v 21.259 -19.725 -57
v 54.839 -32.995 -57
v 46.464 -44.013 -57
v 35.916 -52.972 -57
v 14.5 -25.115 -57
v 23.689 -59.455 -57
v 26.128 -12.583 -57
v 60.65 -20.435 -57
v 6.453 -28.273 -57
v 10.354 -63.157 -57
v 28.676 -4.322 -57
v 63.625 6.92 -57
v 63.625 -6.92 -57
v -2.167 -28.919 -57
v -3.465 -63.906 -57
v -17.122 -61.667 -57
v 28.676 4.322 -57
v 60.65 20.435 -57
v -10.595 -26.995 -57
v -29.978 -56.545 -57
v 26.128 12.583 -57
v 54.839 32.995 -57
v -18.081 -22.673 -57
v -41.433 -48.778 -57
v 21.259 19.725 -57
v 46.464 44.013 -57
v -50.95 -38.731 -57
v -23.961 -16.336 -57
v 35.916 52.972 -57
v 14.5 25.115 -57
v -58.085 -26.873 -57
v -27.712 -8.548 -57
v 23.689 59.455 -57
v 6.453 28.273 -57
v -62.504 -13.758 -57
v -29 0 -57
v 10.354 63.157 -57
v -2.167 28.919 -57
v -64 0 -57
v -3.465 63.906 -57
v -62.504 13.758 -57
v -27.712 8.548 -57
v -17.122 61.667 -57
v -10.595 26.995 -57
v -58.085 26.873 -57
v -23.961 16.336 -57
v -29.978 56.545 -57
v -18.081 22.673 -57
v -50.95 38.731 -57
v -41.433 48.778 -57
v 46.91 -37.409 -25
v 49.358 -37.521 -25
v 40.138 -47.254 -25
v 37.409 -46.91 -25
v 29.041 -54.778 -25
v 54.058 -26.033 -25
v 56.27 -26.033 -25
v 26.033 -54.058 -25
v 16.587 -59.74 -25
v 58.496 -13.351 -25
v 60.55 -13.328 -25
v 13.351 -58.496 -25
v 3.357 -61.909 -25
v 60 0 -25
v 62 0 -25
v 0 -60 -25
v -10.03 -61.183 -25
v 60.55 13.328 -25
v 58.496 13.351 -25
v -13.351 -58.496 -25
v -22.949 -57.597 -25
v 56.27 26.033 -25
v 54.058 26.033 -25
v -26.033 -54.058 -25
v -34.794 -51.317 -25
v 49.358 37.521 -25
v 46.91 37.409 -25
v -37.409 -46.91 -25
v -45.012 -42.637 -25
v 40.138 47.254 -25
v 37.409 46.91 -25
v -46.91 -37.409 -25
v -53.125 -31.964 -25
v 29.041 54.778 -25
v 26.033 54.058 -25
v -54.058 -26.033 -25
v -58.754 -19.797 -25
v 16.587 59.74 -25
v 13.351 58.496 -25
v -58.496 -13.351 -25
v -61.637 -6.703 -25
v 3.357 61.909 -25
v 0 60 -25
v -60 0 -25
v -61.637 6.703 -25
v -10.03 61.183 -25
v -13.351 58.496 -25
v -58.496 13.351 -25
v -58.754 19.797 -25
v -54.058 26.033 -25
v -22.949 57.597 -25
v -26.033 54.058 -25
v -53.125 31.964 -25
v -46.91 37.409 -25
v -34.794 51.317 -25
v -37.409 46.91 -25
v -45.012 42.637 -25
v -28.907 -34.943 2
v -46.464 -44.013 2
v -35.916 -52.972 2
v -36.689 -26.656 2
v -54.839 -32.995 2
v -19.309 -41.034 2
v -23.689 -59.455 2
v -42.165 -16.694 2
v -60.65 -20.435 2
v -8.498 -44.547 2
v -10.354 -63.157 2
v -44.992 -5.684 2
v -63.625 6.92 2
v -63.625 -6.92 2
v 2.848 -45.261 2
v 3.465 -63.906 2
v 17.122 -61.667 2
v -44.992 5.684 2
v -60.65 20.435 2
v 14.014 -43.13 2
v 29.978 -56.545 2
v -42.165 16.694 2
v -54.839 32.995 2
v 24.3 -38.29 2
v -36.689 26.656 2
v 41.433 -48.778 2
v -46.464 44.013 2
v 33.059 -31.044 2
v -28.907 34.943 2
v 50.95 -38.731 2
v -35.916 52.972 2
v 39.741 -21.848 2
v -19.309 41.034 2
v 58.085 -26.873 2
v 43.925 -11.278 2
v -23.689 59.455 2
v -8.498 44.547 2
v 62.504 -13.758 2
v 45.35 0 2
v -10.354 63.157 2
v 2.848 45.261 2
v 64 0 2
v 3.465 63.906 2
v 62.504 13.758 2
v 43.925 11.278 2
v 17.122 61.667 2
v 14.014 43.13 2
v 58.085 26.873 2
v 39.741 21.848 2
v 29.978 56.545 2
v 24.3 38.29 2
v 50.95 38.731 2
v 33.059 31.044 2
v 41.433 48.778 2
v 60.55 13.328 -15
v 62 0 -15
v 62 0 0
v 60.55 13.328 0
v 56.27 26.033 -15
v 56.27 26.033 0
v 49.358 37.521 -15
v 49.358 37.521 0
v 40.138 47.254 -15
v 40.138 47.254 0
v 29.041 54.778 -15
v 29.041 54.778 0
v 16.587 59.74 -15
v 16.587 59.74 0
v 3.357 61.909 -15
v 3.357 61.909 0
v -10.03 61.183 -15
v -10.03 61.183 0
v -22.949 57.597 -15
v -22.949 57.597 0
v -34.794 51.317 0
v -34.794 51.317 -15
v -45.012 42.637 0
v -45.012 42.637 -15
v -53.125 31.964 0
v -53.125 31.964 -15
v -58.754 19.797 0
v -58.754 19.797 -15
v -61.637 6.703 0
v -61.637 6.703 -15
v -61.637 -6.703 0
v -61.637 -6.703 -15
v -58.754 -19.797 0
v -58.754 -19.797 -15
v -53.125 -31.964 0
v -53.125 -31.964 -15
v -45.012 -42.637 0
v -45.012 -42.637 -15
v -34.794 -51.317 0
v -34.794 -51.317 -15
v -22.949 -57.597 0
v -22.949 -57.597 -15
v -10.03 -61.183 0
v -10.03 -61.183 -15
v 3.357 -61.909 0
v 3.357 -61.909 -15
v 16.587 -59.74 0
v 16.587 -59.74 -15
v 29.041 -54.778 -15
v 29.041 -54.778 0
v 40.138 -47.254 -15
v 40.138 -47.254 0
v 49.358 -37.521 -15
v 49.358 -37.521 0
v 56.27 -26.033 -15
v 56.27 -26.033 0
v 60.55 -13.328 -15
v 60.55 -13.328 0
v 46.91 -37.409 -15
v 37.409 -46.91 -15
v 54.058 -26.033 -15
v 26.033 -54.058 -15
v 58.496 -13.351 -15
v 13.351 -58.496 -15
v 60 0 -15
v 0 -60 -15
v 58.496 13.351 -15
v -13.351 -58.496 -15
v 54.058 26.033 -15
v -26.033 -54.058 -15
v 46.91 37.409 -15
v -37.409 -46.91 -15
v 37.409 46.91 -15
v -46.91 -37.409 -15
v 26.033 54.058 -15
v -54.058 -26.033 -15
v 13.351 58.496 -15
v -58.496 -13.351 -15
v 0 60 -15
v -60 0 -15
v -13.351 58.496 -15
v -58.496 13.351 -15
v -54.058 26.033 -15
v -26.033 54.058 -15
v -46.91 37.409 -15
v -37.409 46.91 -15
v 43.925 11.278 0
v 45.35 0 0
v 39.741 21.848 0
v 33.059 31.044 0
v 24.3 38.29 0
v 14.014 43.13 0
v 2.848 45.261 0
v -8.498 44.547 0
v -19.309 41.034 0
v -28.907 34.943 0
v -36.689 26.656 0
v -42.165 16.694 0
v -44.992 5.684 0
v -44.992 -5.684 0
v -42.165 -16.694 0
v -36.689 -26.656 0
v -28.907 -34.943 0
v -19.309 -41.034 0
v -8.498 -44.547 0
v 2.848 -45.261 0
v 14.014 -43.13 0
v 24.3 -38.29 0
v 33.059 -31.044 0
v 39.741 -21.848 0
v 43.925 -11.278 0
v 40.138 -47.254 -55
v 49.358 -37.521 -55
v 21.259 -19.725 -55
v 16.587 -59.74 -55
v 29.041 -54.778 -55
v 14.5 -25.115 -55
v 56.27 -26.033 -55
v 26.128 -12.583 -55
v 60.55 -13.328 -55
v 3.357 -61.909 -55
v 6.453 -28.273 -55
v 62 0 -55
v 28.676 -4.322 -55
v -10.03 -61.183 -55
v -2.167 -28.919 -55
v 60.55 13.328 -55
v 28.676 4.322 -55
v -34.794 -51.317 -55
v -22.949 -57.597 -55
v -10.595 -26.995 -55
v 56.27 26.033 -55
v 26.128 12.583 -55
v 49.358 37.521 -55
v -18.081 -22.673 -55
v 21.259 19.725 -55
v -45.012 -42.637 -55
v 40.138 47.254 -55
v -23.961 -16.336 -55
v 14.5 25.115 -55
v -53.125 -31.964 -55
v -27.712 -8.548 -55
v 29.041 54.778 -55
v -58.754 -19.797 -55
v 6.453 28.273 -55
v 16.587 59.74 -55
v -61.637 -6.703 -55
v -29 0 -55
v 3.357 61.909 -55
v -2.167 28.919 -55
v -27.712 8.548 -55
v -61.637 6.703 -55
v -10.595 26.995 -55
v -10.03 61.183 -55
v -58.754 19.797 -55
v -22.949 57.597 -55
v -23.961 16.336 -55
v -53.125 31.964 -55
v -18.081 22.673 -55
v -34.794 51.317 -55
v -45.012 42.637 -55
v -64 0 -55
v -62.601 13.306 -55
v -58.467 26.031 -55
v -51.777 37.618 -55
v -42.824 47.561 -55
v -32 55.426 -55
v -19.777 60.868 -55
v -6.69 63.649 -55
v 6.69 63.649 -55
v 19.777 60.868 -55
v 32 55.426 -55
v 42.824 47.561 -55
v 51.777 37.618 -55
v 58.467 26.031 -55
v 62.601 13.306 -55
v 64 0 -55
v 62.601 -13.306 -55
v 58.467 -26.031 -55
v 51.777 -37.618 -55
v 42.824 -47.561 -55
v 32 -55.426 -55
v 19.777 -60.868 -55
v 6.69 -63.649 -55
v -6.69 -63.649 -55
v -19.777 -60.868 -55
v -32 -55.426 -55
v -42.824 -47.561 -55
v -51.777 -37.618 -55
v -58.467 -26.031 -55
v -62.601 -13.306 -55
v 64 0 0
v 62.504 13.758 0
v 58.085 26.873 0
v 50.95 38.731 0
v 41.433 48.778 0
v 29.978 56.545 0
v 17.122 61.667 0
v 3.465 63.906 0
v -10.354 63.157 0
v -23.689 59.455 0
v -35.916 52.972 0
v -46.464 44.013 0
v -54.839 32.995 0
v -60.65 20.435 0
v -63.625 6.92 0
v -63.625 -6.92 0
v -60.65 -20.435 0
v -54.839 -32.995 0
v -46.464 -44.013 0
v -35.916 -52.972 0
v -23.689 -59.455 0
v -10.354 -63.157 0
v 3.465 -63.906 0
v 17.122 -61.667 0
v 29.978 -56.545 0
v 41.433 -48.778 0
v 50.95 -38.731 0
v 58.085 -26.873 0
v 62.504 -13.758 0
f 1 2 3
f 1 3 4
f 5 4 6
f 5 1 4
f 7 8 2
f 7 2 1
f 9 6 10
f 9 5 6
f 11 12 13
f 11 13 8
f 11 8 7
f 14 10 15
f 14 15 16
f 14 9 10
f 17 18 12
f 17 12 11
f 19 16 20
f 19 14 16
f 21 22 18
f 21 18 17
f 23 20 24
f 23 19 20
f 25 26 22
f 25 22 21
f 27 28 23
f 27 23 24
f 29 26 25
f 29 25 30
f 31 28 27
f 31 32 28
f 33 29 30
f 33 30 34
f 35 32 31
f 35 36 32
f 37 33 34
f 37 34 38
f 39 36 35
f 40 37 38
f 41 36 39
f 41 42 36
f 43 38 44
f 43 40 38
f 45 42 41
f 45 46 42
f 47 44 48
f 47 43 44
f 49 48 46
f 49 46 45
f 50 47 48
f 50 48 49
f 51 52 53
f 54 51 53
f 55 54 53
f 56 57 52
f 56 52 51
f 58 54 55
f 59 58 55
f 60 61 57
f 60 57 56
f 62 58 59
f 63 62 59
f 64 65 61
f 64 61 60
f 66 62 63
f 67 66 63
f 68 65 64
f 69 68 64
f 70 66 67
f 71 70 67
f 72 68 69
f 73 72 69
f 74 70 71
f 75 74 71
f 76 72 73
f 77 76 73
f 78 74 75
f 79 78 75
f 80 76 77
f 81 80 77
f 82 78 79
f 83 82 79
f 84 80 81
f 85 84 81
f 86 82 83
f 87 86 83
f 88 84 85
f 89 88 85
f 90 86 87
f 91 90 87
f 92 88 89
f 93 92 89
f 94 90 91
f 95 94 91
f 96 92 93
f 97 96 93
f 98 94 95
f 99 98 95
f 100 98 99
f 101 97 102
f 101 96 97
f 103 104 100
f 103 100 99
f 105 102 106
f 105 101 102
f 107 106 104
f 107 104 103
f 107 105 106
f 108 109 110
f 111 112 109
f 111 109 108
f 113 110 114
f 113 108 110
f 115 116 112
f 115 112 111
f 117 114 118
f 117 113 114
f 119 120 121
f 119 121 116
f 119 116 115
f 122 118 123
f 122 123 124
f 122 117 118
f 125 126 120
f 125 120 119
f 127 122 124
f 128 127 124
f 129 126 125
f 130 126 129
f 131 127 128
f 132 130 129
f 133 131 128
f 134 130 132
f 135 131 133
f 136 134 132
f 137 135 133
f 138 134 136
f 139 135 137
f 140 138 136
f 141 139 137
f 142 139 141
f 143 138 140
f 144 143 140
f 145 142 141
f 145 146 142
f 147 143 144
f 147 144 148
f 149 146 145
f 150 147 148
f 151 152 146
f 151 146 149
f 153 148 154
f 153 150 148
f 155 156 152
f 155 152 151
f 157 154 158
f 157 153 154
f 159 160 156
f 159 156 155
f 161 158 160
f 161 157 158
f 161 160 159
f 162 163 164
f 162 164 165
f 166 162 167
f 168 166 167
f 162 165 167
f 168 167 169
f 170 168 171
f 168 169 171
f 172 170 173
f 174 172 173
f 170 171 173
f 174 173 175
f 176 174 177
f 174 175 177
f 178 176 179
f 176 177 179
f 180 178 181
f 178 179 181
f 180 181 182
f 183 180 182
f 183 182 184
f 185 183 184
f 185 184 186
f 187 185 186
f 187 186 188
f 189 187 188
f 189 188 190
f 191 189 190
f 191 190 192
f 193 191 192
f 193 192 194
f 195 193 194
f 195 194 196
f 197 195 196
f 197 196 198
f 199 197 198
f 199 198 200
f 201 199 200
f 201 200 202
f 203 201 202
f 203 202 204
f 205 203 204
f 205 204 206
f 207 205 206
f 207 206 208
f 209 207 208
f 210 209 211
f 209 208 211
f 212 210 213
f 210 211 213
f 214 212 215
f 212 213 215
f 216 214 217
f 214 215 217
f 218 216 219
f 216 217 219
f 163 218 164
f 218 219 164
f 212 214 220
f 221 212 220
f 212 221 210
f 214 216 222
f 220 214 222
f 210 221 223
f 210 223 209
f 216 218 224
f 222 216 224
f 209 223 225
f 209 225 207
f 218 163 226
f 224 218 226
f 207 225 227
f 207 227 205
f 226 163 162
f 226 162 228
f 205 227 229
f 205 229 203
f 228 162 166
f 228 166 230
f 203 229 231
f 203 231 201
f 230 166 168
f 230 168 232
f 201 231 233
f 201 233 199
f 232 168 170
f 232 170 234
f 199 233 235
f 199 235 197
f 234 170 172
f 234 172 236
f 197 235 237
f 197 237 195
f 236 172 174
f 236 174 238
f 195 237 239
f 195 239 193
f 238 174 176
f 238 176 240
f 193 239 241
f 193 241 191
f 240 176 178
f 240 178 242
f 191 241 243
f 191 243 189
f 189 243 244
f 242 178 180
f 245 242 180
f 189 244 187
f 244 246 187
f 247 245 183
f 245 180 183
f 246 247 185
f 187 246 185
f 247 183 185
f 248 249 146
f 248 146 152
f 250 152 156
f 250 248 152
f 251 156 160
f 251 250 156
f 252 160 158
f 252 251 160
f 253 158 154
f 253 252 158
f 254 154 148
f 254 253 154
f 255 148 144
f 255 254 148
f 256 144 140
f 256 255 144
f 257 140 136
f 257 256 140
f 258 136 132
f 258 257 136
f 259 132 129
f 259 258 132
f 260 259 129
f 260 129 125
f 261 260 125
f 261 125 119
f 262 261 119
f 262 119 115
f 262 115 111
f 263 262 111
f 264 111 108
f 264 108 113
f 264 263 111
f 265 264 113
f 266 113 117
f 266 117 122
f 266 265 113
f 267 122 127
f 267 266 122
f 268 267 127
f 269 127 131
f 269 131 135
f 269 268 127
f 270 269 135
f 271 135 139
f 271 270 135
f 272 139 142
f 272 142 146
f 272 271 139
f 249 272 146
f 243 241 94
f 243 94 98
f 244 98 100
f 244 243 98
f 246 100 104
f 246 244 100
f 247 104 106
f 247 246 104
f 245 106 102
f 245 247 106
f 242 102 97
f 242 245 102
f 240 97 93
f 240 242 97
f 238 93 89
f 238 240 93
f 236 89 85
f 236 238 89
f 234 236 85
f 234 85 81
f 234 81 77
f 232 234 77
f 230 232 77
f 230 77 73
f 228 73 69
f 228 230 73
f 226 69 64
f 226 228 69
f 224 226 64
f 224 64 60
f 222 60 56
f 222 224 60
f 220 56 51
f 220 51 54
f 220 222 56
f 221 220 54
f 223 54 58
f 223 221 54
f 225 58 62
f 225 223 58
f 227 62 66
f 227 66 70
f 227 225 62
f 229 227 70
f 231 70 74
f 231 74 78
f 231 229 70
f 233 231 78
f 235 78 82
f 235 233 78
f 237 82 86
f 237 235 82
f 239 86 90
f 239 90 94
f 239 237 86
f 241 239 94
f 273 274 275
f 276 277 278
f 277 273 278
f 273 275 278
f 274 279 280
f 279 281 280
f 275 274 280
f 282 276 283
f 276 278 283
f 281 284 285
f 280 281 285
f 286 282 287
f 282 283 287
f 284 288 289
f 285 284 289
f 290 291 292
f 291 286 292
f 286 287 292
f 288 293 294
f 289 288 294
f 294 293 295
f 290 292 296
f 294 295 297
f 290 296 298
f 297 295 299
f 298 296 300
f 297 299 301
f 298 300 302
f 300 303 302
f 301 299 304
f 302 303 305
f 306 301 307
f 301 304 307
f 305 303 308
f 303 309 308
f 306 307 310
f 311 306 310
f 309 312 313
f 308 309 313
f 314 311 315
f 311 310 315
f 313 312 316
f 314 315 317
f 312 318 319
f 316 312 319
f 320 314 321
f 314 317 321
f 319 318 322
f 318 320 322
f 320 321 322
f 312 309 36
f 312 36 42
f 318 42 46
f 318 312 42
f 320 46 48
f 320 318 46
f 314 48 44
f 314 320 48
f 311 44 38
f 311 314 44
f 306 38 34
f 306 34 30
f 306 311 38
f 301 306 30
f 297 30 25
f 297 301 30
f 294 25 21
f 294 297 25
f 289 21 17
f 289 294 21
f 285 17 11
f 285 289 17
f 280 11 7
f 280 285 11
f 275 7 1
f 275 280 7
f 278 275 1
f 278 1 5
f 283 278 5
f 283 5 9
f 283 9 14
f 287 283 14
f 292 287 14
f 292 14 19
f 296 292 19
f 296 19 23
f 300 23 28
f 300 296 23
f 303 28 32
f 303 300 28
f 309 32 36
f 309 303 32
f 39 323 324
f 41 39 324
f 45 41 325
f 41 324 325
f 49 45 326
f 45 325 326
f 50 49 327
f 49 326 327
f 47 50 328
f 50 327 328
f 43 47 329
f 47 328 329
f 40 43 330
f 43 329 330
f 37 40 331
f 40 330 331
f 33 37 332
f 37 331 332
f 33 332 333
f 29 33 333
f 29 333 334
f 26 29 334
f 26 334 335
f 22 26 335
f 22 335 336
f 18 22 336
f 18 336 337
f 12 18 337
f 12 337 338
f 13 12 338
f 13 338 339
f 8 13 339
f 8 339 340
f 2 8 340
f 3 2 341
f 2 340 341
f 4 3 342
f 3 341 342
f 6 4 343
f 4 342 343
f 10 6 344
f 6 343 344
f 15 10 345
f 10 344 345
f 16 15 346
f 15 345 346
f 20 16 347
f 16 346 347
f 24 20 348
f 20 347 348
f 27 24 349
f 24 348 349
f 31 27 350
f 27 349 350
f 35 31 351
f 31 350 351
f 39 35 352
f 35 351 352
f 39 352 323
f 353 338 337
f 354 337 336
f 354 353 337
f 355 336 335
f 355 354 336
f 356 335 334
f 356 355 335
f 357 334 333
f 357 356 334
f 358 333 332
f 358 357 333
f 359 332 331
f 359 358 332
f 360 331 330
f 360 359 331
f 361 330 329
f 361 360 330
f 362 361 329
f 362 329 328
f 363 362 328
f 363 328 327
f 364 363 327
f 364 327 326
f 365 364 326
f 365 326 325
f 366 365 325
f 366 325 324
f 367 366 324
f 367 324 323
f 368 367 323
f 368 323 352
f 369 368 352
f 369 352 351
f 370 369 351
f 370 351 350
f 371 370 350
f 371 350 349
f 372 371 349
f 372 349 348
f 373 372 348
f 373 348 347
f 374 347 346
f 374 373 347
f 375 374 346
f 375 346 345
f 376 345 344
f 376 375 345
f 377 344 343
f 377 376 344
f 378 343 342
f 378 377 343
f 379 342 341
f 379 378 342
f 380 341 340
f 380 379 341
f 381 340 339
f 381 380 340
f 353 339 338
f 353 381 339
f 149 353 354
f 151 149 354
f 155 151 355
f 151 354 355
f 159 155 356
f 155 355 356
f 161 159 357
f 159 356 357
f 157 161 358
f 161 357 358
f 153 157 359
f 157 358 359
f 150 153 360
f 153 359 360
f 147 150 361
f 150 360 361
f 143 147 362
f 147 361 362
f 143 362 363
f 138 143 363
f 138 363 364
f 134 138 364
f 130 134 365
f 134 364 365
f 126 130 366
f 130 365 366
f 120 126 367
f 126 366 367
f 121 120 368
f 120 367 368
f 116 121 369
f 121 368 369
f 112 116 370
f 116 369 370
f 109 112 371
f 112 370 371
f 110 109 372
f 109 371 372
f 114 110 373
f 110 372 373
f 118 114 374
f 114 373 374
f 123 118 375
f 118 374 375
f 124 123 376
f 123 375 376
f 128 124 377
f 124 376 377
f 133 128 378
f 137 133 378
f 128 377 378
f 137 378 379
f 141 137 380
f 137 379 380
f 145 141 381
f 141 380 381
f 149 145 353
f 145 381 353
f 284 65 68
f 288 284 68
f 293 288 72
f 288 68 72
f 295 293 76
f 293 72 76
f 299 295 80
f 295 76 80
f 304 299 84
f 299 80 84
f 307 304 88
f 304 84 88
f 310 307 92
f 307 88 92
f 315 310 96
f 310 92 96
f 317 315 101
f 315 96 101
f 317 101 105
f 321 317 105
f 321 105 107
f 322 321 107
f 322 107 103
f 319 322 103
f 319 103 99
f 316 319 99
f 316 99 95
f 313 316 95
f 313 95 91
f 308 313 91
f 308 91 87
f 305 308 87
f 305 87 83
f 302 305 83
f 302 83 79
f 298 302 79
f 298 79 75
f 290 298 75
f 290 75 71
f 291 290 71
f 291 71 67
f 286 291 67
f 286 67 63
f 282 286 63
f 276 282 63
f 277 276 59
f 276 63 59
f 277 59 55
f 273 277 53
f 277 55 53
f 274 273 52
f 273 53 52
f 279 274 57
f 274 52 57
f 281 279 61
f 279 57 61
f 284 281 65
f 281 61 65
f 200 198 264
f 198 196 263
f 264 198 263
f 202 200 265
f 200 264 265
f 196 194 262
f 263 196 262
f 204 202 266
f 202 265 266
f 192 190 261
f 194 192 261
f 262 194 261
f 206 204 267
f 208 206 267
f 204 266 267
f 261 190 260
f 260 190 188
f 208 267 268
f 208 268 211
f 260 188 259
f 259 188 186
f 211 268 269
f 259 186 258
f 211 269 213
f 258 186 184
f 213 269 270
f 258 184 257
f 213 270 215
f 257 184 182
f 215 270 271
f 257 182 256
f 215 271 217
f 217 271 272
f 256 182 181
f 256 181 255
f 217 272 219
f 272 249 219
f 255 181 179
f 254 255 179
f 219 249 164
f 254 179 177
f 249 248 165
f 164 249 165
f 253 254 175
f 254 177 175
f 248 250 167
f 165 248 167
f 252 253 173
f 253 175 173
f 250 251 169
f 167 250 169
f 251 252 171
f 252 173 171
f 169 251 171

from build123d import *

# Parameters (mm, degrees)
SKETCH1_R           = 64
SKETCH1_R_2         = 62
BOSS_EXTRUDE1_DEPTH = 55
SKETCH2_R           = 62
SKETCH2_R_2         = 60
BOSS_EXTRUDE2_DEPTH = 10
SKETCH3_R           = 64
SKETCH3_R_2         = 45.35
BOSS_EXTRUDE3_DEPTH = 2
SKETCH4_R           = 64
SKETCH4_R_2         = 29
BOSS_EXTRUDE4_DEPTH = 2


with BuildPart() as part:
    # Sketch1 → Boss-Extrude1 (new body)
    with BuildSketch(Plane.XY):
        Circle(SKETCH1_R)
        Circle(SKETCH1_R_2, mode=Mode.SUBTRACT)
    extrude(amount=-BOSS_EXTRUDE1_DEPTH)

    # Sketch2 → Boss-Extrude2 (add)
    with BuildSketch(Plane(origin=(0, 0, -15), x_dir=(-1, 0, 0), z_dir=(0, 0, -1))):
        Circle(SKETCH2_R)
        Circle(SKETCH2_R_2, mode=Mode.SUBTRACT)
    extrude(amount=BOSS_EXTRUDE2_DEPTH)

    # Sketch3 → Boss-Extrude3 (add)
    with BuildSketch(Plane.XY):
        Circle(SKETCH3_R)
        Circle(SKETCH3_R_2, mode=Mode.SUBTRACT)
    extrude(amount=BOSS_EXTRUDE3_DEPTH)

    # Sketch4 → Boss-Extrude4 (add)
    with BuildSketch(Plane(origin=(0, 0, -55), x_dir=(-1, 0, 0), z_dir=(0, 0, -1))):
        Circle(SKETCH4_R)
        Circle(SKETCH4_R_2, mode=Mode.SUBTRACT)
    extrude(amount=BOSS_EXTRUDE4_DEPTH)


solid = part.part
